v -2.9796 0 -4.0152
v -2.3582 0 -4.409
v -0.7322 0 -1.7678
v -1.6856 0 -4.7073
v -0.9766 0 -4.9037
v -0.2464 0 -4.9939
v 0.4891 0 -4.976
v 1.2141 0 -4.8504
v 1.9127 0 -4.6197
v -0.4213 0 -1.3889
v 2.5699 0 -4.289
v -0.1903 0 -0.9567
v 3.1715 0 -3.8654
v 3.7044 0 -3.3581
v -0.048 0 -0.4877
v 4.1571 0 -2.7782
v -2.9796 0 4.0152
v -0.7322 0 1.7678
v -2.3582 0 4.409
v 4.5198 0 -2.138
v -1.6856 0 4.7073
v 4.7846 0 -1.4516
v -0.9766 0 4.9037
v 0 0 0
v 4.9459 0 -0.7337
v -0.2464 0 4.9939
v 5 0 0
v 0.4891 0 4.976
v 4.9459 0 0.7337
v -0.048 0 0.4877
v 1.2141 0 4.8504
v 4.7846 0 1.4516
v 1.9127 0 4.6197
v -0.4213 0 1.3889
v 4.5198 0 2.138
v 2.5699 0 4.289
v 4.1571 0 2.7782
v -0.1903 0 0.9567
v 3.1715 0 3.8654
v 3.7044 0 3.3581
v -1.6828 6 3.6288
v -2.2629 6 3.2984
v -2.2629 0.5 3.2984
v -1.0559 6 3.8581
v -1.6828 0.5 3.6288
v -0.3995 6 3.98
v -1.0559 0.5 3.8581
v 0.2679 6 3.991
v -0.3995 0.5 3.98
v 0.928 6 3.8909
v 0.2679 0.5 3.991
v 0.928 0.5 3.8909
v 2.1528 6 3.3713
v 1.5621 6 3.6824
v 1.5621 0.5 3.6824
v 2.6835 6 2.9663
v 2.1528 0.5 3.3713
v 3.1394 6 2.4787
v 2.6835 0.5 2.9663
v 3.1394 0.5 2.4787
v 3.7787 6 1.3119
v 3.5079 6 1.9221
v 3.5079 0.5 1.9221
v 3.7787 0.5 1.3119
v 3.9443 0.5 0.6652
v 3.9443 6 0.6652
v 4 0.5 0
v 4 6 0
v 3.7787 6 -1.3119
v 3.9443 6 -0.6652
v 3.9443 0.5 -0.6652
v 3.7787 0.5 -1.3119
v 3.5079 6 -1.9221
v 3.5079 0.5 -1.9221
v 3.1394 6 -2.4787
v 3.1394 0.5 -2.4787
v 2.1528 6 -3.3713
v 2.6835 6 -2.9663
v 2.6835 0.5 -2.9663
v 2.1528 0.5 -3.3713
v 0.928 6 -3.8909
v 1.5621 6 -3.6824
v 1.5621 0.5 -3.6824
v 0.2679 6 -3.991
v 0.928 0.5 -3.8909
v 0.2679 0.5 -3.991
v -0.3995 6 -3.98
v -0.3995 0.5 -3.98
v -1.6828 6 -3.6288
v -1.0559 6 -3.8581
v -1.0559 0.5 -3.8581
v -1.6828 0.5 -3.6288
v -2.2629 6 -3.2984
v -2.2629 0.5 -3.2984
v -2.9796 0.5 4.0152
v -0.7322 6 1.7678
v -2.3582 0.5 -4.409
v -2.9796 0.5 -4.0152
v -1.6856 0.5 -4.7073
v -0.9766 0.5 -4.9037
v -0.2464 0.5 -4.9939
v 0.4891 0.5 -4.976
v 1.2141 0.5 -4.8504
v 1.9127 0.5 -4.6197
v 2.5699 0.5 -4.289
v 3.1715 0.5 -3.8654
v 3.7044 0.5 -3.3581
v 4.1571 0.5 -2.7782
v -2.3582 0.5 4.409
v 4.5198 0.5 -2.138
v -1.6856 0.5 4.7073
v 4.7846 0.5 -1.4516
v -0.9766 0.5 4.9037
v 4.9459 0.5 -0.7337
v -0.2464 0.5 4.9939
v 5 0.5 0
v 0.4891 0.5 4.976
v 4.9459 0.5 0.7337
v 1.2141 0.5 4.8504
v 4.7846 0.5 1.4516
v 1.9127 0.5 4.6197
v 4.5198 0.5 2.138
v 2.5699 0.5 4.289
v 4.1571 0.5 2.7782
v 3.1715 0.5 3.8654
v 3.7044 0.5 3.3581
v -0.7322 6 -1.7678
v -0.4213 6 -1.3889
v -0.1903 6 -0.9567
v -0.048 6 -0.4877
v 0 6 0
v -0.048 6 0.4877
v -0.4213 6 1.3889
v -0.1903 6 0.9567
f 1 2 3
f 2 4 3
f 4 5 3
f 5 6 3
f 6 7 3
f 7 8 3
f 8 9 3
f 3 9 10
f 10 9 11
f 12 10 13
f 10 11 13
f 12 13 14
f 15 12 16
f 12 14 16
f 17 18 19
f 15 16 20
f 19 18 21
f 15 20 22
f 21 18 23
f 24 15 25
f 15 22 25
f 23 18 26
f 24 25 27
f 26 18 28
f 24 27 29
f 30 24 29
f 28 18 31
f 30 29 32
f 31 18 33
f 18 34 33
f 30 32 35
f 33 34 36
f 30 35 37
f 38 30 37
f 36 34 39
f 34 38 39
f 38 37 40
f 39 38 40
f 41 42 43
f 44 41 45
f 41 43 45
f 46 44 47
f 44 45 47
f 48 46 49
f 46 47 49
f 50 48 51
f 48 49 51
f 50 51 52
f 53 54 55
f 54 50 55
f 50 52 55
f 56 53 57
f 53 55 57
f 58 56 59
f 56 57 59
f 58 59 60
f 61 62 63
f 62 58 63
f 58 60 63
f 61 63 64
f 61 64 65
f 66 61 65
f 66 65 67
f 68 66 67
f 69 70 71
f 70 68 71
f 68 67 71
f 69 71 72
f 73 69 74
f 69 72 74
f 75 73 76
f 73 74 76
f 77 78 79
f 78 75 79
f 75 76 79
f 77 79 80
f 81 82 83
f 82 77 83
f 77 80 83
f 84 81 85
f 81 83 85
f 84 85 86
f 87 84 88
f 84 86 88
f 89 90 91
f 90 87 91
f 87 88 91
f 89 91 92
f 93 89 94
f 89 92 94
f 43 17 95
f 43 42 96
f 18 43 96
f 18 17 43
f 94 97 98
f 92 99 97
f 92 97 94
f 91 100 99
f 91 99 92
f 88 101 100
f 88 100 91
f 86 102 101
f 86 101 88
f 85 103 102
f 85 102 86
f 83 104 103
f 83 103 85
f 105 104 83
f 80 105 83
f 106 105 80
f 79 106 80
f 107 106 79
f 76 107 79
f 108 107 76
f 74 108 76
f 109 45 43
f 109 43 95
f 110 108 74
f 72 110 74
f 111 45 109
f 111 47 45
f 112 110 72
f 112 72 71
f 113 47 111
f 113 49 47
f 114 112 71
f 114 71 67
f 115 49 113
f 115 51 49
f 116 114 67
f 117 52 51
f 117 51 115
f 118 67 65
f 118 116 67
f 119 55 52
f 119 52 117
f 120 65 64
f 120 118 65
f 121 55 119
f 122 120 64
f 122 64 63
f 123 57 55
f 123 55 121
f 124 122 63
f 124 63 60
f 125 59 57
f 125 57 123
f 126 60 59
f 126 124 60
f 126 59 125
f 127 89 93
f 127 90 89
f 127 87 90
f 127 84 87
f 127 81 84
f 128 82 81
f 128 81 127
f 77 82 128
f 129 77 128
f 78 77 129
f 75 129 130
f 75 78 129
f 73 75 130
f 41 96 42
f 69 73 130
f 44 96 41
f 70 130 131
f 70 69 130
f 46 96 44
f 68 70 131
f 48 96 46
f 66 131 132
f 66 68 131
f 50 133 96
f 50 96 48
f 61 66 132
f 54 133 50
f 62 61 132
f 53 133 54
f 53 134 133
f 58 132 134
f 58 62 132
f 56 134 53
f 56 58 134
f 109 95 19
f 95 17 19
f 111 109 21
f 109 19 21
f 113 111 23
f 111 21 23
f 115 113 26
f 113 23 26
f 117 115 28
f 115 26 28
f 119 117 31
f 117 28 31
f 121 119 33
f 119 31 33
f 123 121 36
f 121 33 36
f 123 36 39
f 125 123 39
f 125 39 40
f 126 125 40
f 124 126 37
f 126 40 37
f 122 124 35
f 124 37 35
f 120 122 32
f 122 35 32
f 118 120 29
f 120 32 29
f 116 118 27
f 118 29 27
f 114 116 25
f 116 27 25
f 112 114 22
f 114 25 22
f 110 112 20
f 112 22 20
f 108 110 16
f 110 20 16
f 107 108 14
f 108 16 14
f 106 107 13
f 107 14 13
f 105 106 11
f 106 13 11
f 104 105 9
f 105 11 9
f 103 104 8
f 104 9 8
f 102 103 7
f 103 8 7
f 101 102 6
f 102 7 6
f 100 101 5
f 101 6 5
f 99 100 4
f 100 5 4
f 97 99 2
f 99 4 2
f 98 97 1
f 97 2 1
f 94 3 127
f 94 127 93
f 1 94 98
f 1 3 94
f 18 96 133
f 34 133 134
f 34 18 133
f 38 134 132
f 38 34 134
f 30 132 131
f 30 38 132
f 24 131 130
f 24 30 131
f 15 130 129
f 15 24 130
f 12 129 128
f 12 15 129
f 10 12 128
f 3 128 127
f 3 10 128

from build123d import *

# Parameters (mm, degrees)
SKETCH1_R           = 5
SKETCH1_R_2         = 4
BOSS_EXTRUDE1_DEPTH = 0.5
SKETCH1_3_R         = 4
BOSS_EXTRUDE2_DEPTH = 6
CUT_EXTRUDE2_DEPTH  = 10.273618495


with BuildPart() as part:
    # Sketch1 → Boss-Extrude1 (new body)
    with BuildSketch(Plane(origin=(0, 0, 0), x_dir=(1, 0, 0), z_dir=(0, 1, 0))):
        Circle(SKETCH1_R)
        Circle(SKETCH1_R_2, mode=Mode.SUBTRACT)
    extrude(amount=BOSS_EXTRUDE1_DEPTH)

    # Sketch1<3> → Boss-Extrude2 (add)
    with BuildSketch(Plane(origin=(0, 0, 0), x_dir=(1, 0, 0), z_dir=(0, 1, 0))):
        Circle(SKETCH1_3_R)
    extrude(amount=BOSS_EXTRUDE2_DEPTH)

    # Sketch2 → Cut-Extrude2 (cut, through all)
    with BuildSketch(Plane(origin=(0, 0, 0), x_dir=(1, 0, 0), z_dir=(0, 1, 0))):
        with BuildLine():
            Line((-0.732233047, 1.767766953), (-2.979648862, 4.015182768))
            ThreePointArc((-2.979648862, 4.015182768), (-5, 0), (-2.979648862, -4.015182768))
            Line((-2.979648862, -4.015182768), (-0.732233047, -1.767766953))
            ThreePointArc((-0.732233047, -1.767766953), (0, 0), (-0.732233047, 1.767766953))
        make_face()
    extrude(amount=CUT_EXTRUDE2_DEPTH, mode=Mode.SUBTRACT)


solid = part.part
